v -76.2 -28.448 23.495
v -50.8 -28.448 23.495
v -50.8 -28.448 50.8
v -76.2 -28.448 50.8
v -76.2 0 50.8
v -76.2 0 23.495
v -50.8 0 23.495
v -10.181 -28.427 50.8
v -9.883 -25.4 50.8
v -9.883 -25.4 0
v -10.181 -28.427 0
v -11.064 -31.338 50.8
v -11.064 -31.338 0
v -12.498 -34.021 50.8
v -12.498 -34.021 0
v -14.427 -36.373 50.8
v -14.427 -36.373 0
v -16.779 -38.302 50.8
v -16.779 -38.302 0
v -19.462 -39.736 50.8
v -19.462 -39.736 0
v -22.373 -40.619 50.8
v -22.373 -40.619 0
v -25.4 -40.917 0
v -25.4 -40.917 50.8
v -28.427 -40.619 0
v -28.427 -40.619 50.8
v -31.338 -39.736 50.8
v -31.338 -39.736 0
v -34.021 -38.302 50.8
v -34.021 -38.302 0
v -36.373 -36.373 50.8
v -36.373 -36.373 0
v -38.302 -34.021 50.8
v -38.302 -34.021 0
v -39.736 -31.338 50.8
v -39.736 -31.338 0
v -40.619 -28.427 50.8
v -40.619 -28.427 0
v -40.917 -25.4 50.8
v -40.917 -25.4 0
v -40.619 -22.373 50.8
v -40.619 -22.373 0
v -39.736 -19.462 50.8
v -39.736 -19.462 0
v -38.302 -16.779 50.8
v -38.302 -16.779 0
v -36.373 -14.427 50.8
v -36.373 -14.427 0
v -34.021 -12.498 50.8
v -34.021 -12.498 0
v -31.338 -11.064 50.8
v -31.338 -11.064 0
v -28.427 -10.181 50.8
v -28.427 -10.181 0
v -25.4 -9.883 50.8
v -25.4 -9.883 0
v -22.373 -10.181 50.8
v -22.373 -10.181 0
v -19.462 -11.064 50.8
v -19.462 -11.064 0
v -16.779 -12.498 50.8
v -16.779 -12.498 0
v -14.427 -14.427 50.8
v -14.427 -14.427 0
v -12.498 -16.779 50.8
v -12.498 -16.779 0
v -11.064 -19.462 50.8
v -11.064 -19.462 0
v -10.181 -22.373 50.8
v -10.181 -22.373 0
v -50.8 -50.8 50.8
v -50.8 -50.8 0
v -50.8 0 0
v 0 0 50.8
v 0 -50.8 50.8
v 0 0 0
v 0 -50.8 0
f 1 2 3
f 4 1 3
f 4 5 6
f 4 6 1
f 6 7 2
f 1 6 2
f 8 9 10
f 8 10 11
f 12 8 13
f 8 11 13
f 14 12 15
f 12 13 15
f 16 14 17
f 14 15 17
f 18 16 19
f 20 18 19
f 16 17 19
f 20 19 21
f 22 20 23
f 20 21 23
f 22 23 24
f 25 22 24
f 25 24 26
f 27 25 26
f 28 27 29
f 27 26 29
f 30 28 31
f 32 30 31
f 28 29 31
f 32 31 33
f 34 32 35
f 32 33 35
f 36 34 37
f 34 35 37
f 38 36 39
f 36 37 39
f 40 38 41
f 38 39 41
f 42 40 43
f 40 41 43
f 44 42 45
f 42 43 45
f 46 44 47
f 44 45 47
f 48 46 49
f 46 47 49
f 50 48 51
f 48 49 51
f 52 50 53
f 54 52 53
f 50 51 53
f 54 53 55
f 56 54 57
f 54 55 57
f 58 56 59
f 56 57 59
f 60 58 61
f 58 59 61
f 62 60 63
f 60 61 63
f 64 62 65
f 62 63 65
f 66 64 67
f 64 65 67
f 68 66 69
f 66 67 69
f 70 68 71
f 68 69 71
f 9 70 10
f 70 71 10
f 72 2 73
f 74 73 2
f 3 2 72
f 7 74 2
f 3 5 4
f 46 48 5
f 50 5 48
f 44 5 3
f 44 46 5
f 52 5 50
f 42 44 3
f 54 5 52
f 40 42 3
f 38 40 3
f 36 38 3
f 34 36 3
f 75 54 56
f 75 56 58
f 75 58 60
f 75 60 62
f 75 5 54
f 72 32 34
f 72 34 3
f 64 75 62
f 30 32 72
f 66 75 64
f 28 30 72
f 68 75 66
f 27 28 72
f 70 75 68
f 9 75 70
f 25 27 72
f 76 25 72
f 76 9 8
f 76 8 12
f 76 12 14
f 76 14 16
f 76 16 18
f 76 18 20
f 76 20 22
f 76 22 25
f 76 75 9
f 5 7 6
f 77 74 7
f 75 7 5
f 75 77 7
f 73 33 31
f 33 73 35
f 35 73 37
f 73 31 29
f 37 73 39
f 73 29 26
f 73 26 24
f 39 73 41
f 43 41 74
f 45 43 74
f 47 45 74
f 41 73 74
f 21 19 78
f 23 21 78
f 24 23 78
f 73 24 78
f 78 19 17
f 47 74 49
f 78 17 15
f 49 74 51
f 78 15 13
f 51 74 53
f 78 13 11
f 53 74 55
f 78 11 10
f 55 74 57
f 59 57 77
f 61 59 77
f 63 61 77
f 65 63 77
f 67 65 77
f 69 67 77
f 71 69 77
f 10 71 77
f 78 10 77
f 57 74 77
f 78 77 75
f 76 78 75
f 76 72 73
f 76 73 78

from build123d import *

# Parameters (mm, degrees)
F0_W     = 50.8
F0_H     = 50.8
F1_DEPTH = 50.8
F2_W     = 28.448
F2_H     = 27.305
F3_DEPTH = 25.4
F4_R     = 15.517483
F5_DEPTH = 50.8


with BuildPart() as f1:
    # F0 (on Front) → F1 (new body)
    with BuildSketch(Plane.XZ):
        with Locations((-25.4, 25.4)):
            Rectangle(F0_W, F0_H)
    extrude(amount=F1_DEPTH)

    # F2 (on face) → F3 (join)
    with BuildSketch(Plane(origin=(-50.8, 0, 0), x_dir=(0, -1, 0), z_dir=(-1, 0, 0))):
        with Locations((14.224, 37.1475)):
            Rectangle(F2_W, F2_H)
    extrude(amount=F3_DEPTH)

    # F4 (on face) → F5 (cut)
    with BuildSketch(Plane(origin=(0, 0, 0), x_dir=(1, 0, 0), z_dir=(0, 0, -1))):
        with Locations((-25.4, 25.4)):
            Circle(F4_R)
    extrude(amount=-F5_DEPTH, mode=Mode.SUBTRACT)


solid = f1.part
